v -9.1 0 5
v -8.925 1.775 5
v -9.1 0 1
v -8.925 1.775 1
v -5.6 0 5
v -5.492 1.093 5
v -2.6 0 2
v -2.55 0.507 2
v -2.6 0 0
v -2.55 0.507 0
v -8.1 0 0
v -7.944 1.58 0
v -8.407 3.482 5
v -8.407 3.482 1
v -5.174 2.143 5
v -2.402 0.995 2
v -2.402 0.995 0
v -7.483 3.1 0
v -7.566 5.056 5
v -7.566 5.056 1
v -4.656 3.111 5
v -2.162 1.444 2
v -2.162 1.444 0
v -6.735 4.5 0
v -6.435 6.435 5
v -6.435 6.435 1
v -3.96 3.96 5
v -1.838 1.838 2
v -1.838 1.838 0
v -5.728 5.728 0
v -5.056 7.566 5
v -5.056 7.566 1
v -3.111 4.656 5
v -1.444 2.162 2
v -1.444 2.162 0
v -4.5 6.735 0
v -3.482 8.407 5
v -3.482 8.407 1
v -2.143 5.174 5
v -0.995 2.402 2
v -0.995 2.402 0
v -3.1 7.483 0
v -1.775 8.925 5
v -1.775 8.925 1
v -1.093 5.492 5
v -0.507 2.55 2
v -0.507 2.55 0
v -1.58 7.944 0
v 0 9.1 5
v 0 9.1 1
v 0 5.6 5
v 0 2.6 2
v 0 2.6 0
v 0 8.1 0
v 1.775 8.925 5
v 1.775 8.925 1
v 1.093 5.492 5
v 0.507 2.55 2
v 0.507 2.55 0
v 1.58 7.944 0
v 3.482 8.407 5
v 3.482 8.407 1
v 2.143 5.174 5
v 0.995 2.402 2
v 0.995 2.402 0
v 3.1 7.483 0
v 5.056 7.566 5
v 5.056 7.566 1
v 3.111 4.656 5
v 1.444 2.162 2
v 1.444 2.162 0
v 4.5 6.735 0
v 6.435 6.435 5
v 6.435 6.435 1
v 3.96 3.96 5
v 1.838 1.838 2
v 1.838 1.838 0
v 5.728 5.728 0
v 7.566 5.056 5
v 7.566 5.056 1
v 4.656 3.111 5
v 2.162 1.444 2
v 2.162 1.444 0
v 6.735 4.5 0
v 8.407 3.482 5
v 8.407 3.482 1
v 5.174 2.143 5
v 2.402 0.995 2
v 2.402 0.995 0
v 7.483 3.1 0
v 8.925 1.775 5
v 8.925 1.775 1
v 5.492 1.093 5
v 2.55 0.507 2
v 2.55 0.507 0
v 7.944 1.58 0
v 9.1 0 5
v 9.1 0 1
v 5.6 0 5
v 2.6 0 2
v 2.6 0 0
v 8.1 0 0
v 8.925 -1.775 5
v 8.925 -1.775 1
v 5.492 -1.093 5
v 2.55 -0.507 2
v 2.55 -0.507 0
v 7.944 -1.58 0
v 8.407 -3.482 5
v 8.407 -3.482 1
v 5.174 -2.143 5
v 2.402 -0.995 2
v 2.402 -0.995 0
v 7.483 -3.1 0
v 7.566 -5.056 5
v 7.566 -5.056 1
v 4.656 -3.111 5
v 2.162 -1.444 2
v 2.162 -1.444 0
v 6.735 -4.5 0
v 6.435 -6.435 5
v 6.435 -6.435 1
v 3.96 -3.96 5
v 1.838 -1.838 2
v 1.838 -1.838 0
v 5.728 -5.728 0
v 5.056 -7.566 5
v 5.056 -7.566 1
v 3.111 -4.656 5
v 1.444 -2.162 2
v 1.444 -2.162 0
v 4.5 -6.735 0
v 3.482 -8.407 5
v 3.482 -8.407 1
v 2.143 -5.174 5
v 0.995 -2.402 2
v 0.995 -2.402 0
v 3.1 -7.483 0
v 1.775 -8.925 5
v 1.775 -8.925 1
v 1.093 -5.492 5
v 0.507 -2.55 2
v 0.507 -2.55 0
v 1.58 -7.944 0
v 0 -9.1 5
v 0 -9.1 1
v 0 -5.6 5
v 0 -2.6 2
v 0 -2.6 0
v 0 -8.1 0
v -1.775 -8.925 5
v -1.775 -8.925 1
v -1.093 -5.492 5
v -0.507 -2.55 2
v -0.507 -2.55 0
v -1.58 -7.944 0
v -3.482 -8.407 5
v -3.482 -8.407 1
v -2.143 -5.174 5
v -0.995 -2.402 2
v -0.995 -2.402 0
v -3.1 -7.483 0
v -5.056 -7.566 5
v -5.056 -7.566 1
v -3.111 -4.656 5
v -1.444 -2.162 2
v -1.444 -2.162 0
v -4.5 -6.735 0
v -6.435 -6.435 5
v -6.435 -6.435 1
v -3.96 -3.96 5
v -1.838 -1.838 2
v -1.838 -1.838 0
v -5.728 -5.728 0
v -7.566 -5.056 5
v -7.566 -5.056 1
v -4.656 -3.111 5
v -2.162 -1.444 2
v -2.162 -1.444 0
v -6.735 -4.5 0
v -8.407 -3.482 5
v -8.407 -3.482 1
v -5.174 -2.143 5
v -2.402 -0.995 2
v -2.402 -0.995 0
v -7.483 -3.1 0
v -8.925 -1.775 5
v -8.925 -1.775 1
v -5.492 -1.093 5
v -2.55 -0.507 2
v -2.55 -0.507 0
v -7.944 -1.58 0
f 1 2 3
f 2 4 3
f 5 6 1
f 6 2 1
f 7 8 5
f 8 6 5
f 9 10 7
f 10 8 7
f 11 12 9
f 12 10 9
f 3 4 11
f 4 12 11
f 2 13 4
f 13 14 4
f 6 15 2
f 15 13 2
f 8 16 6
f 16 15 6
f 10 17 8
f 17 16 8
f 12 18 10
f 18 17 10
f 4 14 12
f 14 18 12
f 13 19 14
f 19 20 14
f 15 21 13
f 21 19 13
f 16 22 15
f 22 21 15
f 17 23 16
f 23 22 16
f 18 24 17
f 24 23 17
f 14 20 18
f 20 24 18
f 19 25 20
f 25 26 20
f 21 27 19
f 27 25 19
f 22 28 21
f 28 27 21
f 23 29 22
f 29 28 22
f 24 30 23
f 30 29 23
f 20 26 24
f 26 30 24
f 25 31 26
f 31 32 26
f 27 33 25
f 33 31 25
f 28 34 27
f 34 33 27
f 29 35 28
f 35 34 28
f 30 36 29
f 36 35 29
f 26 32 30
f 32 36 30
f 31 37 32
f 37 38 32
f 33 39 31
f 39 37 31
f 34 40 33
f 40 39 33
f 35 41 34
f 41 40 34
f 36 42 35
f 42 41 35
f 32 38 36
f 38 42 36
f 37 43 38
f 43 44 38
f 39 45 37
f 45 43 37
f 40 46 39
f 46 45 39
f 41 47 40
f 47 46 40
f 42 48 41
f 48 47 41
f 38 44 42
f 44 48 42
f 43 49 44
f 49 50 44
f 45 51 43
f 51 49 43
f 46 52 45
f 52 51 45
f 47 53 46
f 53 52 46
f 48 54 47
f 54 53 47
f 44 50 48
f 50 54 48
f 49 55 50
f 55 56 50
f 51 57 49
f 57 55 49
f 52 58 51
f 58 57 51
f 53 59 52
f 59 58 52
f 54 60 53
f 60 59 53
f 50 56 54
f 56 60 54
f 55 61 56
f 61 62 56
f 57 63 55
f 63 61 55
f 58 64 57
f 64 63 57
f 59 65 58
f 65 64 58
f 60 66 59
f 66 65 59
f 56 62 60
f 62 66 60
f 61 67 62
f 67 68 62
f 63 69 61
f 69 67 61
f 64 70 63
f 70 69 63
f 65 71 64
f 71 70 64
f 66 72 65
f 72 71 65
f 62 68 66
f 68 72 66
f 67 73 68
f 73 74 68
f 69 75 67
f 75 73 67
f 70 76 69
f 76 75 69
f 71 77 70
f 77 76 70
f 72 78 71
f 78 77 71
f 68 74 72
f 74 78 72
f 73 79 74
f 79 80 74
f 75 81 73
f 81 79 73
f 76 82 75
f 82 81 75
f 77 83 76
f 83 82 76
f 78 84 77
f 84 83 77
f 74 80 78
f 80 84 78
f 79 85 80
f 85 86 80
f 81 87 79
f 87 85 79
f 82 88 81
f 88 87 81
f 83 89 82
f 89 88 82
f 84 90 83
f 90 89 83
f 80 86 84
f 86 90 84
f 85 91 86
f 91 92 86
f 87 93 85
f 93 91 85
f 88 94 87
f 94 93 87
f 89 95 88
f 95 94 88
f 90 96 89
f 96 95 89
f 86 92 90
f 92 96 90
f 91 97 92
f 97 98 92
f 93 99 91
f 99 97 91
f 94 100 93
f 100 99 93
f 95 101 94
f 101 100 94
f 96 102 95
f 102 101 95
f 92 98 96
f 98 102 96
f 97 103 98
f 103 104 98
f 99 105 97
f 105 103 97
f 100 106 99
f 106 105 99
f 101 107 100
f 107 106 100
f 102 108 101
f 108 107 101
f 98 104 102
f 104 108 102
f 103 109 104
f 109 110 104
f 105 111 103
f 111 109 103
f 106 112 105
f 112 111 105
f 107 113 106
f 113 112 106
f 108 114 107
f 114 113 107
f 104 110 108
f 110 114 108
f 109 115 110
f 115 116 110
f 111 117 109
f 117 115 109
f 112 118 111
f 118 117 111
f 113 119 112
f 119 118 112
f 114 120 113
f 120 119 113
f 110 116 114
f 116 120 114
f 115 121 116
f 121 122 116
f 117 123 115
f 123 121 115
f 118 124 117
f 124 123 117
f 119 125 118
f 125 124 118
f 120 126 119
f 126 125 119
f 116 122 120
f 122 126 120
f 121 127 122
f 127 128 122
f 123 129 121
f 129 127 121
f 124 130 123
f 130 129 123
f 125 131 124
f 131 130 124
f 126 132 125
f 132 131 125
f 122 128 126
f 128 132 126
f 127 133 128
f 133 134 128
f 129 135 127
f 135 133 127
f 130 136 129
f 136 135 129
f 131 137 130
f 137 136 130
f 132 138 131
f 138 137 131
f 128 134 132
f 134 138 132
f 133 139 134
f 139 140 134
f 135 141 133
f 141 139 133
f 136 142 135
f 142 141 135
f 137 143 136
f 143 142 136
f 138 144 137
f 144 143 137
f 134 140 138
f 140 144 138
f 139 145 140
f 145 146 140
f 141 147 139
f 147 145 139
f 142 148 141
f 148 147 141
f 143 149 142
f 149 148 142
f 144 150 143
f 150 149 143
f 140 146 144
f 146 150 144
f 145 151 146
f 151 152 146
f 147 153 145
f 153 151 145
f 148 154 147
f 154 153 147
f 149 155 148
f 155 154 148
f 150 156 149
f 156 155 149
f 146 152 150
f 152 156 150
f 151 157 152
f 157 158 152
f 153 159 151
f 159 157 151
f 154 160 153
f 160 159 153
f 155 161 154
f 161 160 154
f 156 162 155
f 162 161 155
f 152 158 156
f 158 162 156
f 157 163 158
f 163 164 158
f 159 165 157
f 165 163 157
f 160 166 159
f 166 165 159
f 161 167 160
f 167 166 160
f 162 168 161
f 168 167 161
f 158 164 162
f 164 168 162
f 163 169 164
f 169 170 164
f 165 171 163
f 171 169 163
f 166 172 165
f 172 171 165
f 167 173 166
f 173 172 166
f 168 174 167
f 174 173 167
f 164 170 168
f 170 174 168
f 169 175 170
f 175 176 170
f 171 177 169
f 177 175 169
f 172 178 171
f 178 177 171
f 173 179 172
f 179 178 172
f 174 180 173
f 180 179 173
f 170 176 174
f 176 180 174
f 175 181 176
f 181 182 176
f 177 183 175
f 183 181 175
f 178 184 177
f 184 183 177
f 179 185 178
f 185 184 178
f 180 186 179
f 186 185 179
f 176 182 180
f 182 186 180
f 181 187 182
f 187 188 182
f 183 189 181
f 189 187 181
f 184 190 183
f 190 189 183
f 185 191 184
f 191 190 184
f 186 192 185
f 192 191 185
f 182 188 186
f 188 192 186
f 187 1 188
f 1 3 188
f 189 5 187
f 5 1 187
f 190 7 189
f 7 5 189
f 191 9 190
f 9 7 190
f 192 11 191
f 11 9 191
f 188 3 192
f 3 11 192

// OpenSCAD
$fn = 32;

// ----------------------------------------------------------------------
// Form washer: countersunk washer, 18.2 mm outside, 5.2 mm bore
// ----------------------------------------------------------------------

// --- parameters (mm) ---
revolve_angle = 360;      // full turn around the Z axis
profile_points = 6;       // points of the closed outline

profile = [[2.6, 0], [8.1, 0], [9.1, 1], [9.1, 5], [5.6, 5], [2.6, 2]];  // single closed polygon, 6 points, counter clockwise

// --- the one profile operation ---
rotate_extrude(angle = revolve_angle) polygon(points = profile);
